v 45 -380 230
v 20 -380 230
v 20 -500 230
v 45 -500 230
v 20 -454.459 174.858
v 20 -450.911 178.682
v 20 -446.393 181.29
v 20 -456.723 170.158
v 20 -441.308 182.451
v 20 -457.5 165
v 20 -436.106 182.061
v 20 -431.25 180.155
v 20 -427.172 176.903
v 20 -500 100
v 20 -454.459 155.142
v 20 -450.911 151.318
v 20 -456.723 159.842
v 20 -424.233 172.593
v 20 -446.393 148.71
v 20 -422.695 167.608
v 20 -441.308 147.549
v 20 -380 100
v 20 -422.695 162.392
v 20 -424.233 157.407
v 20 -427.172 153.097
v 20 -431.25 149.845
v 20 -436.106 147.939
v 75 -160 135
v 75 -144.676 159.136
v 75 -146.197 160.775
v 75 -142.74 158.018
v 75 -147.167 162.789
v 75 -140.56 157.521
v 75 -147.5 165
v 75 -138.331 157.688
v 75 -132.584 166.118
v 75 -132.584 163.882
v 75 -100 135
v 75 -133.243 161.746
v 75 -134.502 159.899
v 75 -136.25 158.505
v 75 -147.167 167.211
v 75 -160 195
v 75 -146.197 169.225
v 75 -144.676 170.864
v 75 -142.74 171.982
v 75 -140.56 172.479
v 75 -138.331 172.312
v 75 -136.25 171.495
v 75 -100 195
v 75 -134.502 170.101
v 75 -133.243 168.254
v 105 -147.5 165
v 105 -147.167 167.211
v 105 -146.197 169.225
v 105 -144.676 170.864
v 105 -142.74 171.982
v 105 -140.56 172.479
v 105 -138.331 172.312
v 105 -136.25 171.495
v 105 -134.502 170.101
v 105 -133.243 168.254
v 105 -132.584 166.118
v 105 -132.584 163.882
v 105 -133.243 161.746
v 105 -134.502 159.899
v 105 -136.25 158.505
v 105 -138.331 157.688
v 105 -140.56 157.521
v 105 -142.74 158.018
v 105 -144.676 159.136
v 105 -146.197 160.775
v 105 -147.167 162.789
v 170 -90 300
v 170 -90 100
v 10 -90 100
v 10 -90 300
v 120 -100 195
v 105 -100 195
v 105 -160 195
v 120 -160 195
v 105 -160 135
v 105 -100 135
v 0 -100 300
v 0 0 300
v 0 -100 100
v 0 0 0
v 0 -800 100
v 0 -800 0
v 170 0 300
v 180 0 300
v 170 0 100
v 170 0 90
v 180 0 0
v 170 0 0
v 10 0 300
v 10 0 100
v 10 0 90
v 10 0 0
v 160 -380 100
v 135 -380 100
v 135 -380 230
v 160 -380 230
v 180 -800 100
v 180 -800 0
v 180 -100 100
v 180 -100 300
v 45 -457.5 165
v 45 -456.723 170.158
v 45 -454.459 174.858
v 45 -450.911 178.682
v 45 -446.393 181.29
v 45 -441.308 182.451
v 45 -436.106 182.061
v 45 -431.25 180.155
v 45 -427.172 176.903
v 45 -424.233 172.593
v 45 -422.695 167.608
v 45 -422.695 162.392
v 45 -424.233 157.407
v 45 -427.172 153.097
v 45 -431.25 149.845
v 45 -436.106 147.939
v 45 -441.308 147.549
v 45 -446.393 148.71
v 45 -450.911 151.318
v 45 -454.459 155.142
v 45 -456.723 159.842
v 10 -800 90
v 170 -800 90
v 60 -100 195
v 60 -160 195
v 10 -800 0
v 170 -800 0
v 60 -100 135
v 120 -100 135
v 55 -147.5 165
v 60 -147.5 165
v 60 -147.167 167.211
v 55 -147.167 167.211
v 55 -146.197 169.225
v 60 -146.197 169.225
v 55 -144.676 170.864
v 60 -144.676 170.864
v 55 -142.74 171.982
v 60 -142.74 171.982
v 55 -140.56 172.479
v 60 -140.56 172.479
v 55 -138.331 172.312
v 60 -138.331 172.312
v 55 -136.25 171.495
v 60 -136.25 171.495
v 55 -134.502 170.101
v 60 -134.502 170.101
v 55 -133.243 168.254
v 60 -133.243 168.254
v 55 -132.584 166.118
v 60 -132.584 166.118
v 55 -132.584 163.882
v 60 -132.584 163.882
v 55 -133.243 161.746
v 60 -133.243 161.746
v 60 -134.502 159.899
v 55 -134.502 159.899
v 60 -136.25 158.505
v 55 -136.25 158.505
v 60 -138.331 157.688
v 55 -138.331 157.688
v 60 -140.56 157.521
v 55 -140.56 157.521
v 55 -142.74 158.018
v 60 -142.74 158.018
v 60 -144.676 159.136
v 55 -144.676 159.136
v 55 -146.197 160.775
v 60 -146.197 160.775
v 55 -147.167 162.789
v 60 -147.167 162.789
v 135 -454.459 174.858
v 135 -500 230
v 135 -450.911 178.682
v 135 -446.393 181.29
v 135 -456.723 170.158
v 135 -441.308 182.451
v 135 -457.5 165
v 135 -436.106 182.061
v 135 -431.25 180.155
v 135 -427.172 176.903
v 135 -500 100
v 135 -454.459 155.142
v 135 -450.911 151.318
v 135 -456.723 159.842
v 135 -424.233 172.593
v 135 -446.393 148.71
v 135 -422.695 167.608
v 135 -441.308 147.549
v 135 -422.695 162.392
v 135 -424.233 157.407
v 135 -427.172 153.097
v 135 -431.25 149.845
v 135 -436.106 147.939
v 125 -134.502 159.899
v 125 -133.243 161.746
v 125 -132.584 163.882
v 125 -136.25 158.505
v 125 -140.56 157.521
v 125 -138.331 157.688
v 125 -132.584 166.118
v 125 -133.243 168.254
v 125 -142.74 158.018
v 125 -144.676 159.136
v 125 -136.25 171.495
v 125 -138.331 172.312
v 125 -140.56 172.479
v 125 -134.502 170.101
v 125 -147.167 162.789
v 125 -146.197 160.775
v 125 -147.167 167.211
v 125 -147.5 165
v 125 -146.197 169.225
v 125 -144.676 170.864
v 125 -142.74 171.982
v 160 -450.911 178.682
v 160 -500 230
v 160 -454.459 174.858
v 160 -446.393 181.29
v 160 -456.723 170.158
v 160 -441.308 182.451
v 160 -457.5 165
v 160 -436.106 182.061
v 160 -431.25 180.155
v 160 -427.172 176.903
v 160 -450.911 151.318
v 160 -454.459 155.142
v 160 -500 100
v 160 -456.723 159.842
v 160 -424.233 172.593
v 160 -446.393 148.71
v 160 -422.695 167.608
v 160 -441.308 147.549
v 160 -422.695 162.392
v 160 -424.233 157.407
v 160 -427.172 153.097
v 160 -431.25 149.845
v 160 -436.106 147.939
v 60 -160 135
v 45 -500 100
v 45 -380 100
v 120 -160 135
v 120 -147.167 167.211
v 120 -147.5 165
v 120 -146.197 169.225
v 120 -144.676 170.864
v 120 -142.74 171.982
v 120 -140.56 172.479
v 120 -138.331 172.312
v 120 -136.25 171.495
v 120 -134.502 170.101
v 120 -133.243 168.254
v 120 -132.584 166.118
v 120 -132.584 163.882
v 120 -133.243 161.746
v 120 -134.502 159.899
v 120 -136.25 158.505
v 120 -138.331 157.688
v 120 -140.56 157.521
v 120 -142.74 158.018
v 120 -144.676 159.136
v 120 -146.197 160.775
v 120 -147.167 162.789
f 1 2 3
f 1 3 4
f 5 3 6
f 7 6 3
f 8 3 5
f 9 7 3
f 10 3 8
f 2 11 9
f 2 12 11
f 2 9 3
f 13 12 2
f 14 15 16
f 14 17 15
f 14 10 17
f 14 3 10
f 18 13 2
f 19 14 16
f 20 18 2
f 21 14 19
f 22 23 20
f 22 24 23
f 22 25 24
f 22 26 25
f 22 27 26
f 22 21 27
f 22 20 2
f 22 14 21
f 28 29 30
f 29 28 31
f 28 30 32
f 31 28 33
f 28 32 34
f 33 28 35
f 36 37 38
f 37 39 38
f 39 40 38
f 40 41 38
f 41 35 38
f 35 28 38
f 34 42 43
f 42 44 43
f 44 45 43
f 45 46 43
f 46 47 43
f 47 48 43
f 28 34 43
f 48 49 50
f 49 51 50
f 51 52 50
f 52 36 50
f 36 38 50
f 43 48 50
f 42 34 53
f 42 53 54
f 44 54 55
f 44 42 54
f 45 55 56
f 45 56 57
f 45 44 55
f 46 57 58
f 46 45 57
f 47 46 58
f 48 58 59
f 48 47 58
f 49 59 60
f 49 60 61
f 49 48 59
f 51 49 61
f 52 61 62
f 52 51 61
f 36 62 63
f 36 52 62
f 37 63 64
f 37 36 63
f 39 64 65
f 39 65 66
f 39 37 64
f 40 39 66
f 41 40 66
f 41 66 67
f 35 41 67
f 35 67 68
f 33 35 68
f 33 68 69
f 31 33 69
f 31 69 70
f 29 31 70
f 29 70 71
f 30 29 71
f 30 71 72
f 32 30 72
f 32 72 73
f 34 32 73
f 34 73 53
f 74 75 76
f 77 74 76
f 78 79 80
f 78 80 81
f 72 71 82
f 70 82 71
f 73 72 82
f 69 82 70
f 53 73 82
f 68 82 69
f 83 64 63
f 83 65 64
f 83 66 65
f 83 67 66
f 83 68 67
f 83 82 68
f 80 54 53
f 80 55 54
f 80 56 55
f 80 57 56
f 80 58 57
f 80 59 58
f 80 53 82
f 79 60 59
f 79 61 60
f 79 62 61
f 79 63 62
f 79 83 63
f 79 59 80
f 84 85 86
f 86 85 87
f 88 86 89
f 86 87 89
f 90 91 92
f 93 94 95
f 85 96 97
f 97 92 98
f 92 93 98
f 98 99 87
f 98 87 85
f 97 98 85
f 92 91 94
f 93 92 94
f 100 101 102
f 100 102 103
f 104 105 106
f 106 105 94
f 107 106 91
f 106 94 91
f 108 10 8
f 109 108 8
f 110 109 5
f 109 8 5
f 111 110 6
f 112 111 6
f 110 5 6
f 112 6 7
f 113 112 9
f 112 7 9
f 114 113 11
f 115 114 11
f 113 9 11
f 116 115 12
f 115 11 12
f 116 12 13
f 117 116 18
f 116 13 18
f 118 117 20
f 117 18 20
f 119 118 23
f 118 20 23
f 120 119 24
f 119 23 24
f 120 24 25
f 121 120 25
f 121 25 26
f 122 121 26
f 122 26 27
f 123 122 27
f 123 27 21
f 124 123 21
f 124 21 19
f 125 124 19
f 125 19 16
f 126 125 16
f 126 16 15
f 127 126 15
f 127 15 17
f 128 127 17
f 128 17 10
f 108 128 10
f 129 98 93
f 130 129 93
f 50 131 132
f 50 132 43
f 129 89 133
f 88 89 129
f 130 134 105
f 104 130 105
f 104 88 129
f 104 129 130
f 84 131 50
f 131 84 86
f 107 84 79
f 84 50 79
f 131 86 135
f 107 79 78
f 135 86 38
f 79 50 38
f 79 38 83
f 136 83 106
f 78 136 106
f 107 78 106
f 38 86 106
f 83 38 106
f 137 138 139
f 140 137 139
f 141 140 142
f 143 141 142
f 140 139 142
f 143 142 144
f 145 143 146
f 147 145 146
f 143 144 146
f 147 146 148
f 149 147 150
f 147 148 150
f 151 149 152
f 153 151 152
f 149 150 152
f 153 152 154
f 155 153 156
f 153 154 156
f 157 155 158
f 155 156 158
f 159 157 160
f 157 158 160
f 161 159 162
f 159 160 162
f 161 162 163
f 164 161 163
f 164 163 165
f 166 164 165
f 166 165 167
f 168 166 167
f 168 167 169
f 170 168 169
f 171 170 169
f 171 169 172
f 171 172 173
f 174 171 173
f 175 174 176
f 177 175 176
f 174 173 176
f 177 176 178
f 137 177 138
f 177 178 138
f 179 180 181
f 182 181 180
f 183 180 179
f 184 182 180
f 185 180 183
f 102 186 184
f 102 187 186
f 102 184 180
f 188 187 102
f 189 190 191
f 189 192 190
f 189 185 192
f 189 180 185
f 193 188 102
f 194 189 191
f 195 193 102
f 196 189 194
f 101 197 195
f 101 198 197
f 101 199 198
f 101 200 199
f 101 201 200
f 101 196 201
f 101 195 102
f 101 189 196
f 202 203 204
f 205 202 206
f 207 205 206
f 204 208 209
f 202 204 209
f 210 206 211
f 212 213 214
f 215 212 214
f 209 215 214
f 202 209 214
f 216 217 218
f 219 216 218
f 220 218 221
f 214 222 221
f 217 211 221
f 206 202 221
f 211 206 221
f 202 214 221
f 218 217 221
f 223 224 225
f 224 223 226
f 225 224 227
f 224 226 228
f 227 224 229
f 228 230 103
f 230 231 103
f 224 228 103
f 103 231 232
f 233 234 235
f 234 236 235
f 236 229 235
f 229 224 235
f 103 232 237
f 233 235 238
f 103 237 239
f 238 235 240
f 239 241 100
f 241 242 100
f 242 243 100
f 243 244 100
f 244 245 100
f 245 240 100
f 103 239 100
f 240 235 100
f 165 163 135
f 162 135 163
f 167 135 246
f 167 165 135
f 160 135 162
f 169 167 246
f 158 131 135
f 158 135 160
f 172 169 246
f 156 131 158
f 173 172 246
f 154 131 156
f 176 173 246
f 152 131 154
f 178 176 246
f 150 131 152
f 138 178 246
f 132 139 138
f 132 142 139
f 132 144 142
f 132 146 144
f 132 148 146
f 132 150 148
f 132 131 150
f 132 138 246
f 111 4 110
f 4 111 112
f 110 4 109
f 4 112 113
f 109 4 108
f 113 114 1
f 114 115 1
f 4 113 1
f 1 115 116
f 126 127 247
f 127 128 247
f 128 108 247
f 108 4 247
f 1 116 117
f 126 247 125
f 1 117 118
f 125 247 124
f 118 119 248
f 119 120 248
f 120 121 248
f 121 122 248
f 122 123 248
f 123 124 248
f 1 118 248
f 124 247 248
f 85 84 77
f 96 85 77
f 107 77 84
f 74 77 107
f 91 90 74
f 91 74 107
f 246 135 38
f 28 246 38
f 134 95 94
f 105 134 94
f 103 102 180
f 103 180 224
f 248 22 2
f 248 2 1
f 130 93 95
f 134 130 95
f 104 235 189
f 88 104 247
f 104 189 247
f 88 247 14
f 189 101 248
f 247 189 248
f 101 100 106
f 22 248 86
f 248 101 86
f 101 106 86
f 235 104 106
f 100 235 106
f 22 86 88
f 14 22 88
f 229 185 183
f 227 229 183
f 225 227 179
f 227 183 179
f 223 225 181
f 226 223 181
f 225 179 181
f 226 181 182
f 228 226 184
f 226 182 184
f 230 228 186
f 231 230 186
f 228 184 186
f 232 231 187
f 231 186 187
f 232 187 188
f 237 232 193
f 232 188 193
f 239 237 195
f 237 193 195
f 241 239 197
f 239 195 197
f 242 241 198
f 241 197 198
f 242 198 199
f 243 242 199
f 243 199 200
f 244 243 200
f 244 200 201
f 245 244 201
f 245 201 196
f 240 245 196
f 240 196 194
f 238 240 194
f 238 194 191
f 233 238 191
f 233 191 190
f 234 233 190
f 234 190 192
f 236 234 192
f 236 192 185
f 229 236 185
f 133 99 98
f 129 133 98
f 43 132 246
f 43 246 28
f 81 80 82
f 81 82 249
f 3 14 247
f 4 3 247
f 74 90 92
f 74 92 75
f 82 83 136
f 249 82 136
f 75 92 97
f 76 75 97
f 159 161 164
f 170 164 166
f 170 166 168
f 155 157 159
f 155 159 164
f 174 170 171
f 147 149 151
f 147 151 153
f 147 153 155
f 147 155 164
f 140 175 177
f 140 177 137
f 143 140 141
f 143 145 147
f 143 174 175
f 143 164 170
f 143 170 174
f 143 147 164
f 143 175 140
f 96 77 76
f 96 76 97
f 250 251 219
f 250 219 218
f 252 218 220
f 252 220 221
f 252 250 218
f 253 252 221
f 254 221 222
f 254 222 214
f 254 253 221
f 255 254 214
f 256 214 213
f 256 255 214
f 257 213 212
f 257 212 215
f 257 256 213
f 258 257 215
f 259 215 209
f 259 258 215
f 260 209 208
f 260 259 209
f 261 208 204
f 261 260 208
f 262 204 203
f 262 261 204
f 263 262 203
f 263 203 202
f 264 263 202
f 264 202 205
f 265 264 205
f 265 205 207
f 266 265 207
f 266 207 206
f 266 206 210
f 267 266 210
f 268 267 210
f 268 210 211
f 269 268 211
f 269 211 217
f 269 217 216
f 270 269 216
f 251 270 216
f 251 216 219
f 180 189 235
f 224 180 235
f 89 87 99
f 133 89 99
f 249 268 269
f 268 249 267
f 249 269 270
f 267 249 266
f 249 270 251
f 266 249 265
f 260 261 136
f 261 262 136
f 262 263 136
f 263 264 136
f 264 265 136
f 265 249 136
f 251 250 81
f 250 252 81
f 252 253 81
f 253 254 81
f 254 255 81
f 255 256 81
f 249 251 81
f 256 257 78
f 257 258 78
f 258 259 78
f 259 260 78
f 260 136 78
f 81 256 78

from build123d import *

# Parameters (mm, degrees)
F1_DEPTH      = 800
F3_DEPTH      = 200
F4_W          = 25
F4_H          = 120
F5_DEPTH      = 130
F6_W          = 15
F6_H          = 60
F7_DEPTH      = 60
F8_R          = 7.5
F9_DEPTH      = 65
F9_DEPTH_BACK = 5
F10_R         = 17.5
F11_DEPTH     = 160.001


with BuildPart() as f1:
    # F0 (on Front) → F1 (new body)
    with BuildSketch(Plane.XZ):
        Polygon((0, 100), (0, 0), (10, 0), (10, 90), (170, 90), (170, 0), (180, 0), (180, 100), align=None)
    extrude(amount=F1_DEPTH)

    # F2 (on face) → F3 (join)
    with BuildSketch(Plane.XY.offset(100)):
        Polygon((10, 0), (0, 0), (0, -100), (180, -100), (180, 0), (170, 0), (170, -90), (10, -90), align=None)
    extrude(amount=F3_DEPTH)

    # F4 (on face) → F5 (join)
    with BuildSketch(Plane.XY.offset(100)):
        with Locations((32.5, -440)):
            Rectangle(F4_W, F4_H)
        with Locations((147.5, -440)):
            Rectangle(F4_W, F4_H)
    extrude(amount=F5_DEPTH)

    # F6 (on face) → F7 (join)
    with BuildSketch(Plane.XZ.offset(100)):
        with Locations((67.5, 165)):
            Rectangle(F6_W, F6_H)
        with Locations((112.5, 165)):
            Rectangle(F6_W, F6_H)
    extrude(amount=F7_DEPTH)

    # F8 (on face) → F9 (join, two sides)
    with BuildSketch(Plane(origin=(60, 0, 0), x_dir=(0, -1, 0), z_dir=(-1, 0, 0))) as f9_sk:
        with Locations((140, 165)):
            Circle(F8_R)
    extrude(amount=-F9_DEPTH)
    extrude(f9_sk.sketch, amount=F9_DEPTH_BACK)

    # F10 (on face) → F11 (cut, through all)
    with BuildSketch(Plane(origin=(20, 0, 0), x_dir=(0, -1, 0), z_dir=(-1, 0, 0))):
        with Locations((440, 165)):
            Circle(F10_R)
    extrude(amount=-F11_DEPTH, mode=Mode.SUBTRACT)


solid = f1.part
